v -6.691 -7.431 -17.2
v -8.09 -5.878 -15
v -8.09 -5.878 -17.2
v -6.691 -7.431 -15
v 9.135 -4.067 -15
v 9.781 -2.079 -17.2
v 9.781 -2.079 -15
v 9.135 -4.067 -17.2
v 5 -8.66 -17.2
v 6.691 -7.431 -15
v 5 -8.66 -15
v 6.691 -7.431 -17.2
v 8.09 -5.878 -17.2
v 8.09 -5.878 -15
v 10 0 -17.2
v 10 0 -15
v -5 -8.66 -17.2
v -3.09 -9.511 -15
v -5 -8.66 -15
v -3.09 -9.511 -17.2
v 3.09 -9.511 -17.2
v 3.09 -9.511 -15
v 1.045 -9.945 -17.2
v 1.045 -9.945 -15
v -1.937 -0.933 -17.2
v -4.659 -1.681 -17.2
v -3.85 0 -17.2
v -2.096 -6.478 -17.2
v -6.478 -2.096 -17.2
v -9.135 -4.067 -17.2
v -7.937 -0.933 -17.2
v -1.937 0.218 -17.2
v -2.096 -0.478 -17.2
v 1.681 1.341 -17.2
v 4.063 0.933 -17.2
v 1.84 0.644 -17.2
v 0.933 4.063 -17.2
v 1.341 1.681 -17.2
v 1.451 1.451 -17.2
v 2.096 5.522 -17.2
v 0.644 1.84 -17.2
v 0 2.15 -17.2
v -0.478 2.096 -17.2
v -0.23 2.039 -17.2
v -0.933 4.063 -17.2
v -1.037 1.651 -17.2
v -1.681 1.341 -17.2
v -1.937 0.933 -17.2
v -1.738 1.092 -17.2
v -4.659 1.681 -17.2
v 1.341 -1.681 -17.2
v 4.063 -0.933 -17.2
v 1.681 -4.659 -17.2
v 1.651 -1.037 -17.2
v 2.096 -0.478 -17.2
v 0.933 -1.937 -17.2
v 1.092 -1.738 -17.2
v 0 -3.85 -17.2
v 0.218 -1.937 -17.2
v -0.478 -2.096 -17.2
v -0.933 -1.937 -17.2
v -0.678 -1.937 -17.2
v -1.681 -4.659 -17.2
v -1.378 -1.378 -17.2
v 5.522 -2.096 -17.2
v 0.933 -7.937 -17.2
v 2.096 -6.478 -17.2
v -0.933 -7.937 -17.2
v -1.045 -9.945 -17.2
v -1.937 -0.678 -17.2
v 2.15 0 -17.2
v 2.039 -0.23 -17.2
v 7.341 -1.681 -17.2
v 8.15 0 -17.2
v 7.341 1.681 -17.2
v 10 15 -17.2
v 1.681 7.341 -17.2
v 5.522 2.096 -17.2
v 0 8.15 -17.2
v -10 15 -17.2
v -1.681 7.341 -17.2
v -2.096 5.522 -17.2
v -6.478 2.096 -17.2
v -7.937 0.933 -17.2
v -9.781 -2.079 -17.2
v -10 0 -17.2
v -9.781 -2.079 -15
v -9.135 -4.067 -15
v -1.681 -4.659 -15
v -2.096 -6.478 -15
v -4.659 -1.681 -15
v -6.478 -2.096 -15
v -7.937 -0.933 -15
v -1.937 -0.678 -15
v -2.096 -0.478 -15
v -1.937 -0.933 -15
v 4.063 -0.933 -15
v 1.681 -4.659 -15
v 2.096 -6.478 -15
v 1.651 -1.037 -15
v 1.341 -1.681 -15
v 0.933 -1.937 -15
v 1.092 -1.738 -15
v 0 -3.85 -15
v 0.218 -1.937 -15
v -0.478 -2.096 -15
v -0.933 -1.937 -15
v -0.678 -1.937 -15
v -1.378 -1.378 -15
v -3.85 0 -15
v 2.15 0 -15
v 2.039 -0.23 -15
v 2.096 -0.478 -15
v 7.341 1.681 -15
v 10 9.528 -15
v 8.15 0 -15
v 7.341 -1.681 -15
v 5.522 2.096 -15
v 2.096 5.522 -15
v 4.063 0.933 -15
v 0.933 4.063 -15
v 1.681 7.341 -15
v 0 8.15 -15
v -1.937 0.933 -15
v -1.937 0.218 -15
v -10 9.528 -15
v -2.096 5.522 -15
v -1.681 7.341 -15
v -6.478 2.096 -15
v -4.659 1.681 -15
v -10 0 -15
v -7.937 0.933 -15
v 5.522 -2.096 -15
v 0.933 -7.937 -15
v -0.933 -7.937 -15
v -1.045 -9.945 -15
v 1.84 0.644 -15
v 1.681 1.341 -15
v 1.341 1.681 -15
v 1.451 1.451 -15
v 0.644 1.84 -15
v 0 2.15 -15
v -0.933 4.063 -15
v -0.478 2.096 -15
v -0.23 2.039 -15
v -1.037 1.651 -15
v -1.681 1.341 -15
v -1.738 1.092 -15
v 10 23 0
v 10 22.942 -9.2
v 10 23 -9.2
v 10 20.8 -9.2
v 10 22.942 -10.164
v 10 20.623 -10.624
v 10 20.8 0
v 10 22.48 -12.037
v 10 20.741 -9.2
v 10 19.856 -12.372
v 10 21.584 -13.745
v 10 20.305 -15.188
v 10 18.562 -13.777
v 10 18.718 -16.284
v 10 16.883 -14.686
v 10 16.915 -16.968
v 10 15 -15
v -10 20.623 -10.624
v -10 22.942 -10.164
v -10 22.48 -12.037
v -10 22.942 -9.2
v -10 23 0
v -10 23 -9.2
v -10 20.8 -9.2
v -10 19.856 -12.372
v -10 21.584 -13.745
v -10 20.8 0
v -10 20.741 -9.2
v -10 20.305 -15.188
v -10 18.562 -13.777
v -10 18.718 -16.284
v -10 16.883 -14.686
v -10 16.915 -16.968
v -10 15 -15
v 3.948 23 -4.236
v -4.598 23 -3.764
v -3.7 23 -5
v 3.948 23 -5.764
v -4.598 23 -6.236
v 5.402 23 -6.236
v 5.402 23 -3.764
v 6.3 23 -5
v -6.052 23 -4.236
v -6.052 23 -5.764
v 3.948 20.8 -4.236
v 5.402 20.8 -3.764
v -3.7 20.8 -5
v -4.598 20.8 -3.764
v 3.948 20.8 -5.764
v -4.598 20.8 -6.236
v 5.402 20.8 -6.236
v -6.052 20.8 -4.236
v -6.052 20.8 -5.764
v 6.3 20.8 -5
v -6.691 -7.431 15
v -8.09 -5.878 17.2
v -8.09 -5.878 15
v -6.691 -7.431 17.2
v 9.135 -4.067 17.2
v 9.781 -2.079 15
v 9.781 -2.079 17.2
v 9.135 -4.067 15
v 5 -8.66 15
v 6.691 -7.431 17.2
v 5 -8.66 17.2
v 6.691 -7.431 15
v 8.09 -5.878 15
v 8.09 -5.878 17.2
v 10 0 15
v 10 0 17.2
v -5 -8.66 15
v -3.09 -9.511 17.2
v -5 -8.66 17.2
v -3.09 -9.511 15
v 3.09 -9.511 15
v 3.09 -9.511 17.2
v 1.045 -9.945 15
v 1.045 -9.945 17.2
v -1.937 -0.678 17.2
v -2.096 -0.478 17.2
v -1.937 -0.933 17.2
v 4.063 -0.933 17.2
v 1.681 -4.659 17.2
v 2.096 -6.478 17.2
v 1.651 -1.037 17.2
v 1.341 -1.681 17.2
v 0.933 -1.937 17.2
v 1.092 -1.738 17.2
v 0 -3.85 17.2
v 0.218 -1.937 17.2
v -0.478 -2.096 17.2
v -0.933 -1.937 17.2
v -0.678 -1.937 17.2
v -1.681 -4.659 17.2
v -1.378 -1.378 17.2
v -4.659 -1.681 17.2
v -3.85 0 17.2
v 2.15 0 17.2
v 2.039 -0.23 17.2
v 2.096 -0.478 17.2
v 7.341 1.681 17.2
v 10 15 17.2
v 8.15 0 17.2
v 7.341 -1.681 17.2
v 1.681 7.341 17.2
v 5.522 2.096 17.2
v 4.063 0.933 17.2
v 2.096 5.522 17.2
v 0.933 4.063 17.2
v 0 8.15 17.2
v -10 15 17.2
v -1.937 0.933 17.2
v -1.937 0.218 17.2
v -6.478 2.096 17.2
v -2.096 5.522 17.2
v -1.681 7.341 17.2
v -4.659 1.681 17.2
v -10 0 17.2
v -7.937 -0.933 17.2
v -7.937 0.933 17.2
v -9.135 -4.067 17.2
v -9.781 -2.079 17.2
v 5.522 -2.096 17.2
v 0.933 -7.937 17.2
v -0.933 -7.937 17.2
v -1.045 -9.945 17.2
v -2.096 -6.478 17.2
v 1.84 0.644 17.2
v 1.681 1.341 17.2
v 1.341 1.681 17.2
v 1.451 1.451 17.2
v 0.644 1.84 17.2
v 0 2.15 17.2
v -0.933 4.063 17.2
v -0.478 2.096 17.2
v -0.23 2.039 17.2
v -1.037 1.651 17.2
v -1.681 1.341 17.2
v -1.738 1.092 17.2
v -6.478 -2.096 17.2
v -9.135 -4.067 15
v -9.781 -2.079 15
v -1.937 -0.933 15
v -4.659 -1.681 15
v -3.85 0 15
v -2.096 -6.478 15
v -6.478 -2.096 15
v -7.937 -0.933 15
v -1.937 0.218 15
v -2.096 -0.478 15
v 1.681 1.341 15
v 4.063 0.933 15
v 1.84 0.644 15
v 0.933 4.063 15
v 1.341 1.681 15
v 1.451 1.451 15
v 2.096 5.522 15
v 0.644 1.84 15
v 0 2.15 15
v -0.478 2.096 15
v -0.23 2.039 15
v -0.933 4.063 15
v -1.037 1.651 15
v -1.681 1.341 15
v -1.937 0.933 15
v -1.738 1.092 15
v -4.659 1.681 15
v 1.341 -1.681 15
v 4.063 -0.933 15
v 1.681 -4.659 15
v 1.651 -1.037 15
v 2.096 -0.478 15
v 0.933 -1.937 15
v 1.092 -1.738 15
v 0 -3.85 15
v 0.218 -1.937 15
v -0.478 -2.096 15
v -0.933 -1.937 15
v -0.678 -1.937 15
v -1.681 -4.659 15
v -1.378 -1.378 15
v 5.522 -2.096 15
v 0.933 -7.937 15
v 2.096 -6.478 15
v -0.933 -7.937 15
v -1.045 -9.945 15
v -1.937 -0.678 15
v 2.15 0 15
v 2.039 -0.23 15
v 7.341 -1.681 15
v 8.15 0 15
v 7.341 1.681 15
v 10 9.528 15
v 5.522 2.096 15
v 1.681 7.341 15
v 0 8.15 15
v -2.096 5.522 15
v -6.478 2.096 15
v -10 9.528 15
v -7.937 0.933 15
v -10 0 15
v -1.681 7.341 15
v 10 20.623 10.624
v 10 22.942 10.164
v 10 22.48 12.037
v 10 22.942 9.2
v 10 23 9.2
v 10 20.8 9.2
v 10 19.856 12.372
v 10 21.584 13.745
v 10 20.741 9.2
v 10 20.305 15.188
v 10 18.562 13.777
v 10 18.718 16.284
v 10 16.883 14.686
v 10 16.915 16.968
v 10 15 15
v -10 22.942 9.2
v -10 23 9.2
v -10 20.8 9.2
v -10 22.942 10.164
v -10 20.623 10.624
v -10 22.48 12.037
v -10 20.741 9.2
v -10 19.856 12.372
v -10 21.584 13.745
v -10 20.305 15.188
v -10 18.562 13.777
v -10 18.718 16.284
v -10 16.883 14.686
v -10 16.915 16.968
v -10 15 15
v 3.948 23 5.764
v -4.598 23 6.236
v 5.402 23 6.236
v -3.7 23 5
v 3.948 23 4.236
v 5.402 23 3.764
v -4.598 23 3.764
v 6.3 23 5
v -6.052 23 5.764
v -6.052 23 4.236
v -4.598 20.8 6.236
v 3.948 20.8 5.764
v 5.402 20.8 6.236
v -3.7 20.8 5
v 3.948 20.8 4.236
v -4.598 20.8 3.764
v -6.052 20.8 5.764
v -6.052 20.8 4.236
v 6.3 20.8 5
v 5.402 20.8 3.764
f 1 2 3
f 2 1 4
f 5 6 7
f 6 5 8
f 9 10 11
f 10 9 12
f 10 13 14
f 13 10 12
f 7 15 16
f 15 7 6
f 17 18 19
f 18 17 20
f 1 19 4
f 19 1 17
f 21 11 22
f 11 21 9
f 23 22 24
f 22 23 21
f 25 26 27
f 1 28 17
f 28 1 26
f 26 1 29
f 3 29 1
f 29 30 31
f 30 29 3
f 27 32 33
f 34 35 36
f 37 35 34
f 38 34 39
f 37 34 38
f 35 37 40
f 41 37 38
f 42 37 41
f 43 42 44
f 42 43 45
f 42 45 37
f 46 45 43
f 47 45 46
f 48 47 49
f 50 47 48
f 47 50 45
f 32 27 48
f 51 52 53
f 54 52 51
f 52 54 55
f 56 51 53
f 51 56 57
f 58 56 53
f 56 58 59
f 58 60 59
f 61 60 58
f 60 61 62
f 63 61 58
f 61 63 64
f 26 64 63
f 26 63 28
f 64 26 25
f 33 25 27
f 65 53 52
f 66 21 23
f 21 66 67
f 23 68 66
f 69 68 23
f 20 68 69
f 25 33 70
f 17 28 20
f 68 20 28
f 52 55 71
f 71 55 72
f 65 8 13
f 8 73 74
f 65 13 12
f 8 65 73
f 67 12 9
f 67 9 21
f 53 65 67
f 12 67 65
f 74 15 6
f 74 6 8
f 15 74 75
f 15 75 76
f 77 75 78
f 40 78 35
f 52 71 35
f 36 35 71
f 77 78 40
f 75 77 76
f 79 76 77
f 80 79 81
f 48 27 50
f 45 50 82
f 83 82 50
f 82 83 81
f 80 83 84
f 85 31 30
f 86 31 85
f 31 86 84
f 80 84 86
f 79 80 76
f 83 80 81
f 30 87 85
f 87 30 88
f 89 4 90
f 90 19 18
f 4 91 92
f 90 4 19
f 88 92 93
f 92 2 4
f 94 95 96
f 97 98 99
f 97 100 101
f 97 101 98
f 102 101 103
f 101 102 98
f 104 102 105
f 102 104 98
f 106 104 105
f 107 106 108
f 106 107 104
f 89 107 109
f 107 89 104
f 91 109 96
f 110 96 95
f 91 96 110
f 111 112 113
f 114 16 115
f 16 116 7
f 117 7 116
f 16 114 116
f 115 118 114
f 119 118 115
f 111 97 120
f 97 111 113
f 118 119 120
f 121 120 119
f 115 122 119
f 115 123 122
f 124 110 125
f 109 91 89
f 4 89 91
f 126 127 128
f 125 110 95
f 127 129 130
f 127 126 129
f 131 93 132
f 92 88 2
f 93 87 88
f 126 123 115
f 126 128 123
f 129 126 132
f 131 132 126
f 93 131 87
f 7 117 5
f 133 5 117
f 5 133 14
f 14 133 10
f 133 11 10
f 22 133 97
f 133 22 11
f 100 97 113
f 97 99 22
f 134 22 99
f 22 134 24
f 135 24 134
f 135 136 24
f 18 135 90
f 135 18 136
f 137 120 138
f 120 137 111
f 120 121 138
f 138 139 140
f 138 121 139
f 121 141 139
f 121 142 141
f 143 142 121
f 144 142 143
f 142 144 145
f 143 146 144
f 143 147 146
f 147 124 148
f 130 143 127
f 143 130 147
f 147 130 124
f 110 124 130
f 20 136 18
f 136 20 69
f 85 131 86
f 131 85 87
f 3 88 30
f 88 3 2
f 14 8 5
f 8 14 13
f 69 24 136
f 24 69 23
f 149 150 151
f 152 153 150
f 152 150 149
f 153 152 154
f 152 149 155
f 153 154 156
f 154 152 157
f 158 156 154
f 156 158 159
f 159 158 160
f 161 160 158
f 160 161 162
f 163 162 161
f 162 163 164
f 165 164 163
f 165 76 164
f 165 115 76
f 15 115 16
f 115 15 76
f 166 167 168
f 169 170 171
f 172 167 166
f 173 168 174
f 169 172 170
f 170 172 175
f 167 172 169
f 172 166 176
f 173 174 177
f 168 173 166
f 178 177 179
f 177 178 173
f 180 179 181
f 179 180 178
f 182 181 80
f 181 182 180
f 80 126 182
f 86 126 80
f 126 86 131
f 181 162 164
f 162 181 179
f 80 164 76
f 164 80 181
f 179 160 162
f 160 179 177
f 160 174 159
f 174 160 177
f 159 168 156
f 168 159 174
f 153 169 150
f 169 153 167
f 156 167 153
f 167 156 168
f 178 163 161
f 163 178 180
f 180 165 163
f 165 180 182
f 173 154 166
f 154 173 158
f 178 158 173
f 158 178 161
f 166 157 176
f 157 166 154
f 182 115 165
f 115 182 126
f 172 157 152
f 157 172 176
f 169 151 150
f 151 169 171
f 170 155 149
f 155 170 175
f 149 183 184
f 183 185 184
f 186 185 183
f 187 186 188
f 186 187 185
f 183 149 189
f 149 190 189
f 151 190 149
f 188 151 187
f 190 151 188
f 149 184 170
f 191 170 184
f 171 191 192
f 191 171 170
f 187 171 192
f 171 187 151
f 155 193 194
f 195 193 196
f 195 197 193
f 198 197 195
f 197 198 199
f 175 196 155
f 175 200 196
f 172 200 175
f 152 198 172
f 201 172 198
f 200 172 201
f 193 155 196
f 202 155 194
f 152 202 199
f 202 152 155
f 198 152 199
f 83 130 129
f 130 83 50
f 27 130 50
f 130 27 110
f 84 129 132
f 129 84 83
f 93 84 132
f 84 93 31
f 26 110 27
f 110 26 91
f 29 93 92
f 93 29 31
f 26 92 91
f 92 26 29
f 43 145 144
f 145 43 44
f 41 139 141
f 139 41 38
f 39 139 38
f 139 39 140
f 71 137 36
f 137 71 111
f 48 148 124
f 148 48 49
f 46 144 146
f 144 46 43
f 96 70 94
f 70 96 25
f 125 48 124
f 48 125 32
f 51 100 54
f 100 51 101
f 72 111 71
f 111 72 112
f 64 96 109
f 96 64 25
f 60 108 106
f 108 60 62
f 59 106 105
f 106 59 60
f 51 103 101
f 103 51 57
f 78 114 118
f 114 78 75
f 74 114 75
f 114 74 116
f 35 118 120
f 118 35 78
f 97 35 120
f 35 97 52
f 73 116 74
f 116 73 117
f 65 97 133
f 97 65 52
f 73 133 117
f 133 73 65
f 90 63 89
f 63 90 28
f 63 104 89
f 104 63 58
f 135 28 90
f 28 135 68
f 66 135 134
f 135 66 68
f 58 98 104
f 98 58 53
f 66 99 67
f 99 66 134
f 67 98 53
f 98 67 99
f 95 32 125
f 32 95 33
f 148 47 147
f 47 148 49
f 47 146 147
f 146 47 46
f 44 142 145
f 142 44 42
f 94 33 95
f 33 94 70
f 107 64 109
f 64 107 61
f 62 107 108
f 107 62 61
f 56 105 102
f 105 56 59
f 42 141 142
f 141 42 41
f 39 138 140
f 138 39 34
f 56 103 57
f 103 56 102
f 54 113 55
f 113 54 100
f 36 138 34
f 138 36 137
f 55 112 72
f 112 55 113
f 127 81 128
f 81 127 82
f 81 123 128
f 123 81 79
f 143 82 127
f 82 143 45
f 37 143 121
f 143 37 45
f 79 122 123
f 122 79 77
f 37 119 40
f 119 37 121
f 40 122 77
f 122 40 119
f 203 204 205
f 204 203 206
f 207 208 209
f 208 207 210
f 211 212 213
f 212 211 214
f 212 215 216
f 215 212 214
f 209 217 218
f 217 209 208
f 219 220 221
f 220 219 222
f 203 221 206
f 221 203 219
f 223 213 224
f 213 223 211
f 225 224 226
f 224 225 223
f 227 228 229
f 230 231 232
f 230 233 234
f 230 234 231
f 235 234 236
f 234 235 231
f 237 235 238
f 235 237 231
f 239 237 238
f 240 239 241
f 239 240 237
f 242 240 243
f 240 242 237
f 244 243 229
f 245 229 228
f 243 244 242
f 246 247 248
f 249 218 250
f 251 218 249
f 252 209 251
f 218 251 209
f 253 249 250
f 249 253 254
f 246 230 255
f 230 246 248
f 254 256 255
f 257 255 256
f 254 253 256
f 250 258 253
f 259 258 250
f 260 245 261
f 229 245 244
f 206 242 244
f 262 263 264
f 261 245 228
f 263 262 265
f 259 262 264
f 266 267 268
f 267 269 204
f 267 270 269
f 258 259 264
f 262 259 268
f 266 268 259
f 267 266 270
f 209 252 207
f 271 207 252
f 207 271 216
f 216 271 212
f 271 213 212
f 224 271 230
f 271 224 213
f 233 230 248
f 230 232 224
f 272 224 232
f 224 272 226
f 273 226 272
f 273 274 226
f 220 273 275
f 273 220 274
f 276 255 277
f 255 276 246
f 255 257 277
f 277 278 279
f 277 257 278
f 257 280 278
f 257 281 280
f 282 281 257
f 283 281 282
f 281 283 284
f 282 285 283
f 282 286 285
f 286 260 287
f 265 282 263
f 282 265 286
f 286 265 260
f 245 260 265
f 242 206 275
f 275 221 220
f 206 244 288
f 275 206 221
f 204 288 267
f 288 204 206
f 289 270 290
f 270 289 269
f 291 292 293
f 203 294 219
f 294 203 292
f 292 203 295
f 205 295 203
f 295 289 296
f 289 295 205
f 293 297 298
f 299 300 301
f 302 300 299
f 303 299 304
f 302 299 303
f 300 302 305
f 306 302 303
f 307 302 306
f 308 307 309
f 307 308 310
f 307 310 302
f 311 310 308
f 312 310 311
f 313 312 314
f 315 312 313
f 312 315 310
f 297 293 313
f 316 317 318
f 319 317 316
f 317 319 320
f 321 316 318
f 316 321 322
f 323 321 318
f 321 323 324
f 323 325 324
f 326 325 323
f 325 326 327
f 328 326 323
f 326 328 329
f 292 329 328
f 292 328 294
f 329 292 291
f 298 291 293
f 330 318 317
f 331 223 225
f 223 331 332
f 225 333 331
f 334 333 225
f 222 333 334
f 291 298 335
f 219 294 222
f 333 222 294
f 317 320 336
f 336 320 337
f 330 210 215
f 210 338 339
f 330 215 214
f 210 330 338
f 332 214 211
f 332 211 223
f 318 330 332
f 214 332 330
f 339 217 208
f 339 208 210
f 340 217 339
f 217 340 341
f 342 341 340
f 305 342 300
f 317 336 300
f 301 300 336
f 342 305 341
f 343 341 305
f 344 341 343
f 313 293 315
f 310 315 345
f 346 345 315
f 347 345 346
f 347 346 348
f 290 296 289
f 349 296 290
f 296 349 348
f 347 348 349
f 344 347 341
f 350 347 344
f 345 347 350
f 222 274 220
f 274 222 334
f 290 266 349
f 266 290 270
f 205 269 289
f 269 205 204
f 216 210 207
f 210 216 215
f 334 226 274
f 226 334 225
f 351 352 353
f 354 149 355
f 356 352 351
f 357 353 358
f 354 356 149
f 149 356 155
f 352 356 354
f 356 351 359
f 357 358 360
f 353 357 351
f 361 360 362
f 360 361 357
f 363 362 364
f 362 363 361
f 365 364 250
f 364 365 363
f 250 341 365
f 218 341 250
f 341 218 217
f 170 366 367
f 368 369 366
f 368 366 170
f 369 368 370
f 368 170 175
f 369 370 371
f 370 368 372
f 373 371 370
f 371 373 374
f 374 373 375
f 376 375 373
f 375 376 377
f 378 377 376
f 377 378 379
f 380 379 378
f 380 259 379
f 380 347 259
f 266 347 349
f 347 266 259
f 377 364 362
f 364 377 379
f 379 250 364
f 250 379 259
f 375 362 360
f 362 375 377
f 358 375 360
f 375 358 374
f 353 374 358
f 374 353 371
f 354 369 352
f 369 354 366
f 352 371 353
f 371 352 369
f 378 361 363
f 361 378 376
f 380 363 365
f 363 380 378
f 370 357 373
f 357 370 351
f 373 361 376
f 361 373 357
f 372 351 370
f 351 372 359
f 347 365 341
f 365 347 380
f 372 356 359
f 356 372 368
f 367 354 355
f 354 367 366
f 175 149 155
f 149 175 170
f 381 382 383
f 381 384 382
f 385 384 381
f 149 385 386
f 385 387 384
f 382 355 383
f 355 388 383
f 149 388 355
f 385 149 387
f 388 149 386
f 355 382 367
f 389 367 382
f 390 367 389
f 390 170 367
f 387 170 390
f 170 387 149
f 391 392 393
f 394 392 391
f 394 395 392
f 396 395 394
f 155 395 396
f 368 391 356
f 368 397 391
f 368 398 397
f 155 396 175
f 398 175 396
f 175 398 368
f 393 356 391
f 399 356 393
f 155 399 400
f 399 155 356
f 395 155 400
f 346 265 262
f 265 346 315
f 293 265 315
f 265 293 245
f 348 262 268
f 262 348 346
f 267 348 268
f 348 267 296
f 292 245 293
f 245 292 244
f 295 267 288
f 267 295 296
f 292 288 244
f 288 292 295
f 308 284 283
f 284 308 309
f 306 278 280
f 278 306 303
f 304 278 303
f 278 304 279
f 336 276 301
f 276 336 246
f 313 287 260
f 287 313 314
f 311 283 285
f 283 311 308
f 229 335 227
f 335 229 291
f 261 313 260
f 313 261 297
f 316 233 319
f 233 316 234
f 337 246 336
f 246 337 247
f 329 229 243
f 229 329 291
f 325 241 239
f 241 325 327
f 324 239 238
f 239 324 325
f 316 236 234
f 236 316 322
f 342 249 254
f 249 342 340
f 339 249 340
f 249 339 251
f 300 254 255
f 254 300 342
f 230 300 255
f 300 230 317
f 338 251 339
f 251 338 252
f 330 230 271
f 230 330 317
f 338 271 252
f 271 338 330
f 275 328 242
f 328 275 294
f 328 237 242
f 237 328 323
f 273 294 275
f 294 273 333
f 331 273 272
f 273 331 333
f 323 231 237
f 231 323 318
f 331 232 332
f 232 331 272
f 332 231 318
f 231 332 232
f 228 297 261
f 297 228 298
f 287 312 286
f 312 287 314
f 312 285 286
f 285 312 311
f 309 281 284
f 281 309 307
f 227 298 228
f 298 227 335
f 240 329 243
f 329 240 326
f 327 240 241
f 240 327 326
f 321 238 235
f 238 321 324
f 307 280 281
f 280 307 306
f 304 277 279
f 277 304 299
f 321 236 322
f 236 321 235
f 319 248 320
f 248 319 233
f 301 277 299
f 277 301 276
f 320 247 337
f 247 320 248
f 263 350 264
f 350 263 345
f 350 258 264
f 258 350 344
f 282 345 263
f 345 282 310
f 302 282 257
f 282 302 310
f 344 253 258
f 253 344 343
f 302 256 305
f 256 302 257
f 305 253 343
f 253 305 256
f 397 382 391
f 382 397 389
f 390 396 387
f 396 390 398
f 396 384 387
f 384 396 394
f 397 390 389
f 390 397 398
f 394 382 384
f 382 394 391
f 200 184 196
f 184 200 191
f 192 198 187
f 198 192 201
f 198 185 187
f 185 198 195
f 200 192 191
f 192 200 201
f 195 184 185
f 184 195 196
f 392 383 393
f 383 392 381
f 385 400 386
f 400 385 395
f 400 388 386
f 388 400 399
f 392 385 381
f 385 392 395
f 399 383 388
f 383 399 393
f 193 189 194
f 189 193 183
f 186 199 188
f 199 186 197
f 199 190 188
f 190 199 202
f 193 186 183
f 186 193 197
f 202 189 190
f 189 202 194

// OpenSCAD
// file: ../models/ollo.scad
// Diameter of plastic ollo holes
OlloHoles = 4.3;

// Width of Ollo "real" plastic
OlloWidth = 3;

// Distance between two ollo holes
OlloSpacing = 6;

// Do an Ollo hole on the part
module olloHole(depth=2.2)
{
    translate([0,0,-0.1])
      cylinder(depth+0.2, OlloHoles/2, OlloHoles/2);
}

// Do 3 ollo holes
module threeOllo(depth=2.2)
{
  for (xy=[[-OlloSpacing,0],[0,0],[OlloSpacing,0]]) {
    translate([xy[0], xy[1], 0])
    olloHole(depth);
  }
}

// Do a servo arm holes
module servoArm(depth=2.2)
{
    threeOllo(depth);
    rotate([0,0,90])
      threeOllo(depth);
}
// main file
use <../models/ollo.scad>;

module u(height=15, radius=8, thickness=2.2, screwsSpacing=10, screwsDiameter=2.6, screws=true, olloScrew=false, widthSize=15, print=false) {
    module Ubranch() {
        union() {  
            cylinder(thickness, 10, 10);
            translate([-10,0,0])
                cube([20, height, thickness]);
        }
    }

    module USide() {
        difference() {
            union() {
                Ubranch();
                translate([-10,height+radius-thickness,radius])
                    cube([20,thickness,widthSize-(radius-thickness)]);
                translate([-10,height,radius]) {
                    rotate([0,90,0]) {
                        difference() {
                            cylinder(20,radius,radius);
                            translate([0,0,-1])
                                cylinder(22,radius-thickness,radius-thickness);
                            translate([-10+radius-thickness,-10,-1])
                                cube([10,10,22]);
                            translate([-10,-20+radius-thickness,-1])
                                cube([10,20.01,22]);
                        }
                    }
                }
            }
            servoArm(depth=6);
        }
    }

    module UScrews() {
        for (x=[-screwsSpacing/2,screwsSpacing/2]) {
            for (y=[-screwsSpacing/2,screwsSpacing/2]) {
                rotate([270,0,0])
                    translate([x,y,0])
                    cylinder(d=screwsDiameter, h=100);
            }
        }
    }

	module UOllo() {
		rotate(-90, [1,0,0])
			servoArm(2*height);
	}

    if (print) {
        translate([0,0,10])
            rotate([0,90,0])
            u(height,radius,thickness,screwsSpacing,screwsDiameter,
                screws,olloScrew,widthSize,false);
    } else {
        echo("[PART] u");
        difference() {
            translate([0,0,-widthSize-thickness]) {
                USide();
                mirror([0,0,1]) translate([0,0,-2*thickness-2*widthSize])  
                    USide();
            }
            if (screws) {
                UScrews();
            }
            if (olloScrew) {
                UOllo();
            }
        }
    }
}

u();
